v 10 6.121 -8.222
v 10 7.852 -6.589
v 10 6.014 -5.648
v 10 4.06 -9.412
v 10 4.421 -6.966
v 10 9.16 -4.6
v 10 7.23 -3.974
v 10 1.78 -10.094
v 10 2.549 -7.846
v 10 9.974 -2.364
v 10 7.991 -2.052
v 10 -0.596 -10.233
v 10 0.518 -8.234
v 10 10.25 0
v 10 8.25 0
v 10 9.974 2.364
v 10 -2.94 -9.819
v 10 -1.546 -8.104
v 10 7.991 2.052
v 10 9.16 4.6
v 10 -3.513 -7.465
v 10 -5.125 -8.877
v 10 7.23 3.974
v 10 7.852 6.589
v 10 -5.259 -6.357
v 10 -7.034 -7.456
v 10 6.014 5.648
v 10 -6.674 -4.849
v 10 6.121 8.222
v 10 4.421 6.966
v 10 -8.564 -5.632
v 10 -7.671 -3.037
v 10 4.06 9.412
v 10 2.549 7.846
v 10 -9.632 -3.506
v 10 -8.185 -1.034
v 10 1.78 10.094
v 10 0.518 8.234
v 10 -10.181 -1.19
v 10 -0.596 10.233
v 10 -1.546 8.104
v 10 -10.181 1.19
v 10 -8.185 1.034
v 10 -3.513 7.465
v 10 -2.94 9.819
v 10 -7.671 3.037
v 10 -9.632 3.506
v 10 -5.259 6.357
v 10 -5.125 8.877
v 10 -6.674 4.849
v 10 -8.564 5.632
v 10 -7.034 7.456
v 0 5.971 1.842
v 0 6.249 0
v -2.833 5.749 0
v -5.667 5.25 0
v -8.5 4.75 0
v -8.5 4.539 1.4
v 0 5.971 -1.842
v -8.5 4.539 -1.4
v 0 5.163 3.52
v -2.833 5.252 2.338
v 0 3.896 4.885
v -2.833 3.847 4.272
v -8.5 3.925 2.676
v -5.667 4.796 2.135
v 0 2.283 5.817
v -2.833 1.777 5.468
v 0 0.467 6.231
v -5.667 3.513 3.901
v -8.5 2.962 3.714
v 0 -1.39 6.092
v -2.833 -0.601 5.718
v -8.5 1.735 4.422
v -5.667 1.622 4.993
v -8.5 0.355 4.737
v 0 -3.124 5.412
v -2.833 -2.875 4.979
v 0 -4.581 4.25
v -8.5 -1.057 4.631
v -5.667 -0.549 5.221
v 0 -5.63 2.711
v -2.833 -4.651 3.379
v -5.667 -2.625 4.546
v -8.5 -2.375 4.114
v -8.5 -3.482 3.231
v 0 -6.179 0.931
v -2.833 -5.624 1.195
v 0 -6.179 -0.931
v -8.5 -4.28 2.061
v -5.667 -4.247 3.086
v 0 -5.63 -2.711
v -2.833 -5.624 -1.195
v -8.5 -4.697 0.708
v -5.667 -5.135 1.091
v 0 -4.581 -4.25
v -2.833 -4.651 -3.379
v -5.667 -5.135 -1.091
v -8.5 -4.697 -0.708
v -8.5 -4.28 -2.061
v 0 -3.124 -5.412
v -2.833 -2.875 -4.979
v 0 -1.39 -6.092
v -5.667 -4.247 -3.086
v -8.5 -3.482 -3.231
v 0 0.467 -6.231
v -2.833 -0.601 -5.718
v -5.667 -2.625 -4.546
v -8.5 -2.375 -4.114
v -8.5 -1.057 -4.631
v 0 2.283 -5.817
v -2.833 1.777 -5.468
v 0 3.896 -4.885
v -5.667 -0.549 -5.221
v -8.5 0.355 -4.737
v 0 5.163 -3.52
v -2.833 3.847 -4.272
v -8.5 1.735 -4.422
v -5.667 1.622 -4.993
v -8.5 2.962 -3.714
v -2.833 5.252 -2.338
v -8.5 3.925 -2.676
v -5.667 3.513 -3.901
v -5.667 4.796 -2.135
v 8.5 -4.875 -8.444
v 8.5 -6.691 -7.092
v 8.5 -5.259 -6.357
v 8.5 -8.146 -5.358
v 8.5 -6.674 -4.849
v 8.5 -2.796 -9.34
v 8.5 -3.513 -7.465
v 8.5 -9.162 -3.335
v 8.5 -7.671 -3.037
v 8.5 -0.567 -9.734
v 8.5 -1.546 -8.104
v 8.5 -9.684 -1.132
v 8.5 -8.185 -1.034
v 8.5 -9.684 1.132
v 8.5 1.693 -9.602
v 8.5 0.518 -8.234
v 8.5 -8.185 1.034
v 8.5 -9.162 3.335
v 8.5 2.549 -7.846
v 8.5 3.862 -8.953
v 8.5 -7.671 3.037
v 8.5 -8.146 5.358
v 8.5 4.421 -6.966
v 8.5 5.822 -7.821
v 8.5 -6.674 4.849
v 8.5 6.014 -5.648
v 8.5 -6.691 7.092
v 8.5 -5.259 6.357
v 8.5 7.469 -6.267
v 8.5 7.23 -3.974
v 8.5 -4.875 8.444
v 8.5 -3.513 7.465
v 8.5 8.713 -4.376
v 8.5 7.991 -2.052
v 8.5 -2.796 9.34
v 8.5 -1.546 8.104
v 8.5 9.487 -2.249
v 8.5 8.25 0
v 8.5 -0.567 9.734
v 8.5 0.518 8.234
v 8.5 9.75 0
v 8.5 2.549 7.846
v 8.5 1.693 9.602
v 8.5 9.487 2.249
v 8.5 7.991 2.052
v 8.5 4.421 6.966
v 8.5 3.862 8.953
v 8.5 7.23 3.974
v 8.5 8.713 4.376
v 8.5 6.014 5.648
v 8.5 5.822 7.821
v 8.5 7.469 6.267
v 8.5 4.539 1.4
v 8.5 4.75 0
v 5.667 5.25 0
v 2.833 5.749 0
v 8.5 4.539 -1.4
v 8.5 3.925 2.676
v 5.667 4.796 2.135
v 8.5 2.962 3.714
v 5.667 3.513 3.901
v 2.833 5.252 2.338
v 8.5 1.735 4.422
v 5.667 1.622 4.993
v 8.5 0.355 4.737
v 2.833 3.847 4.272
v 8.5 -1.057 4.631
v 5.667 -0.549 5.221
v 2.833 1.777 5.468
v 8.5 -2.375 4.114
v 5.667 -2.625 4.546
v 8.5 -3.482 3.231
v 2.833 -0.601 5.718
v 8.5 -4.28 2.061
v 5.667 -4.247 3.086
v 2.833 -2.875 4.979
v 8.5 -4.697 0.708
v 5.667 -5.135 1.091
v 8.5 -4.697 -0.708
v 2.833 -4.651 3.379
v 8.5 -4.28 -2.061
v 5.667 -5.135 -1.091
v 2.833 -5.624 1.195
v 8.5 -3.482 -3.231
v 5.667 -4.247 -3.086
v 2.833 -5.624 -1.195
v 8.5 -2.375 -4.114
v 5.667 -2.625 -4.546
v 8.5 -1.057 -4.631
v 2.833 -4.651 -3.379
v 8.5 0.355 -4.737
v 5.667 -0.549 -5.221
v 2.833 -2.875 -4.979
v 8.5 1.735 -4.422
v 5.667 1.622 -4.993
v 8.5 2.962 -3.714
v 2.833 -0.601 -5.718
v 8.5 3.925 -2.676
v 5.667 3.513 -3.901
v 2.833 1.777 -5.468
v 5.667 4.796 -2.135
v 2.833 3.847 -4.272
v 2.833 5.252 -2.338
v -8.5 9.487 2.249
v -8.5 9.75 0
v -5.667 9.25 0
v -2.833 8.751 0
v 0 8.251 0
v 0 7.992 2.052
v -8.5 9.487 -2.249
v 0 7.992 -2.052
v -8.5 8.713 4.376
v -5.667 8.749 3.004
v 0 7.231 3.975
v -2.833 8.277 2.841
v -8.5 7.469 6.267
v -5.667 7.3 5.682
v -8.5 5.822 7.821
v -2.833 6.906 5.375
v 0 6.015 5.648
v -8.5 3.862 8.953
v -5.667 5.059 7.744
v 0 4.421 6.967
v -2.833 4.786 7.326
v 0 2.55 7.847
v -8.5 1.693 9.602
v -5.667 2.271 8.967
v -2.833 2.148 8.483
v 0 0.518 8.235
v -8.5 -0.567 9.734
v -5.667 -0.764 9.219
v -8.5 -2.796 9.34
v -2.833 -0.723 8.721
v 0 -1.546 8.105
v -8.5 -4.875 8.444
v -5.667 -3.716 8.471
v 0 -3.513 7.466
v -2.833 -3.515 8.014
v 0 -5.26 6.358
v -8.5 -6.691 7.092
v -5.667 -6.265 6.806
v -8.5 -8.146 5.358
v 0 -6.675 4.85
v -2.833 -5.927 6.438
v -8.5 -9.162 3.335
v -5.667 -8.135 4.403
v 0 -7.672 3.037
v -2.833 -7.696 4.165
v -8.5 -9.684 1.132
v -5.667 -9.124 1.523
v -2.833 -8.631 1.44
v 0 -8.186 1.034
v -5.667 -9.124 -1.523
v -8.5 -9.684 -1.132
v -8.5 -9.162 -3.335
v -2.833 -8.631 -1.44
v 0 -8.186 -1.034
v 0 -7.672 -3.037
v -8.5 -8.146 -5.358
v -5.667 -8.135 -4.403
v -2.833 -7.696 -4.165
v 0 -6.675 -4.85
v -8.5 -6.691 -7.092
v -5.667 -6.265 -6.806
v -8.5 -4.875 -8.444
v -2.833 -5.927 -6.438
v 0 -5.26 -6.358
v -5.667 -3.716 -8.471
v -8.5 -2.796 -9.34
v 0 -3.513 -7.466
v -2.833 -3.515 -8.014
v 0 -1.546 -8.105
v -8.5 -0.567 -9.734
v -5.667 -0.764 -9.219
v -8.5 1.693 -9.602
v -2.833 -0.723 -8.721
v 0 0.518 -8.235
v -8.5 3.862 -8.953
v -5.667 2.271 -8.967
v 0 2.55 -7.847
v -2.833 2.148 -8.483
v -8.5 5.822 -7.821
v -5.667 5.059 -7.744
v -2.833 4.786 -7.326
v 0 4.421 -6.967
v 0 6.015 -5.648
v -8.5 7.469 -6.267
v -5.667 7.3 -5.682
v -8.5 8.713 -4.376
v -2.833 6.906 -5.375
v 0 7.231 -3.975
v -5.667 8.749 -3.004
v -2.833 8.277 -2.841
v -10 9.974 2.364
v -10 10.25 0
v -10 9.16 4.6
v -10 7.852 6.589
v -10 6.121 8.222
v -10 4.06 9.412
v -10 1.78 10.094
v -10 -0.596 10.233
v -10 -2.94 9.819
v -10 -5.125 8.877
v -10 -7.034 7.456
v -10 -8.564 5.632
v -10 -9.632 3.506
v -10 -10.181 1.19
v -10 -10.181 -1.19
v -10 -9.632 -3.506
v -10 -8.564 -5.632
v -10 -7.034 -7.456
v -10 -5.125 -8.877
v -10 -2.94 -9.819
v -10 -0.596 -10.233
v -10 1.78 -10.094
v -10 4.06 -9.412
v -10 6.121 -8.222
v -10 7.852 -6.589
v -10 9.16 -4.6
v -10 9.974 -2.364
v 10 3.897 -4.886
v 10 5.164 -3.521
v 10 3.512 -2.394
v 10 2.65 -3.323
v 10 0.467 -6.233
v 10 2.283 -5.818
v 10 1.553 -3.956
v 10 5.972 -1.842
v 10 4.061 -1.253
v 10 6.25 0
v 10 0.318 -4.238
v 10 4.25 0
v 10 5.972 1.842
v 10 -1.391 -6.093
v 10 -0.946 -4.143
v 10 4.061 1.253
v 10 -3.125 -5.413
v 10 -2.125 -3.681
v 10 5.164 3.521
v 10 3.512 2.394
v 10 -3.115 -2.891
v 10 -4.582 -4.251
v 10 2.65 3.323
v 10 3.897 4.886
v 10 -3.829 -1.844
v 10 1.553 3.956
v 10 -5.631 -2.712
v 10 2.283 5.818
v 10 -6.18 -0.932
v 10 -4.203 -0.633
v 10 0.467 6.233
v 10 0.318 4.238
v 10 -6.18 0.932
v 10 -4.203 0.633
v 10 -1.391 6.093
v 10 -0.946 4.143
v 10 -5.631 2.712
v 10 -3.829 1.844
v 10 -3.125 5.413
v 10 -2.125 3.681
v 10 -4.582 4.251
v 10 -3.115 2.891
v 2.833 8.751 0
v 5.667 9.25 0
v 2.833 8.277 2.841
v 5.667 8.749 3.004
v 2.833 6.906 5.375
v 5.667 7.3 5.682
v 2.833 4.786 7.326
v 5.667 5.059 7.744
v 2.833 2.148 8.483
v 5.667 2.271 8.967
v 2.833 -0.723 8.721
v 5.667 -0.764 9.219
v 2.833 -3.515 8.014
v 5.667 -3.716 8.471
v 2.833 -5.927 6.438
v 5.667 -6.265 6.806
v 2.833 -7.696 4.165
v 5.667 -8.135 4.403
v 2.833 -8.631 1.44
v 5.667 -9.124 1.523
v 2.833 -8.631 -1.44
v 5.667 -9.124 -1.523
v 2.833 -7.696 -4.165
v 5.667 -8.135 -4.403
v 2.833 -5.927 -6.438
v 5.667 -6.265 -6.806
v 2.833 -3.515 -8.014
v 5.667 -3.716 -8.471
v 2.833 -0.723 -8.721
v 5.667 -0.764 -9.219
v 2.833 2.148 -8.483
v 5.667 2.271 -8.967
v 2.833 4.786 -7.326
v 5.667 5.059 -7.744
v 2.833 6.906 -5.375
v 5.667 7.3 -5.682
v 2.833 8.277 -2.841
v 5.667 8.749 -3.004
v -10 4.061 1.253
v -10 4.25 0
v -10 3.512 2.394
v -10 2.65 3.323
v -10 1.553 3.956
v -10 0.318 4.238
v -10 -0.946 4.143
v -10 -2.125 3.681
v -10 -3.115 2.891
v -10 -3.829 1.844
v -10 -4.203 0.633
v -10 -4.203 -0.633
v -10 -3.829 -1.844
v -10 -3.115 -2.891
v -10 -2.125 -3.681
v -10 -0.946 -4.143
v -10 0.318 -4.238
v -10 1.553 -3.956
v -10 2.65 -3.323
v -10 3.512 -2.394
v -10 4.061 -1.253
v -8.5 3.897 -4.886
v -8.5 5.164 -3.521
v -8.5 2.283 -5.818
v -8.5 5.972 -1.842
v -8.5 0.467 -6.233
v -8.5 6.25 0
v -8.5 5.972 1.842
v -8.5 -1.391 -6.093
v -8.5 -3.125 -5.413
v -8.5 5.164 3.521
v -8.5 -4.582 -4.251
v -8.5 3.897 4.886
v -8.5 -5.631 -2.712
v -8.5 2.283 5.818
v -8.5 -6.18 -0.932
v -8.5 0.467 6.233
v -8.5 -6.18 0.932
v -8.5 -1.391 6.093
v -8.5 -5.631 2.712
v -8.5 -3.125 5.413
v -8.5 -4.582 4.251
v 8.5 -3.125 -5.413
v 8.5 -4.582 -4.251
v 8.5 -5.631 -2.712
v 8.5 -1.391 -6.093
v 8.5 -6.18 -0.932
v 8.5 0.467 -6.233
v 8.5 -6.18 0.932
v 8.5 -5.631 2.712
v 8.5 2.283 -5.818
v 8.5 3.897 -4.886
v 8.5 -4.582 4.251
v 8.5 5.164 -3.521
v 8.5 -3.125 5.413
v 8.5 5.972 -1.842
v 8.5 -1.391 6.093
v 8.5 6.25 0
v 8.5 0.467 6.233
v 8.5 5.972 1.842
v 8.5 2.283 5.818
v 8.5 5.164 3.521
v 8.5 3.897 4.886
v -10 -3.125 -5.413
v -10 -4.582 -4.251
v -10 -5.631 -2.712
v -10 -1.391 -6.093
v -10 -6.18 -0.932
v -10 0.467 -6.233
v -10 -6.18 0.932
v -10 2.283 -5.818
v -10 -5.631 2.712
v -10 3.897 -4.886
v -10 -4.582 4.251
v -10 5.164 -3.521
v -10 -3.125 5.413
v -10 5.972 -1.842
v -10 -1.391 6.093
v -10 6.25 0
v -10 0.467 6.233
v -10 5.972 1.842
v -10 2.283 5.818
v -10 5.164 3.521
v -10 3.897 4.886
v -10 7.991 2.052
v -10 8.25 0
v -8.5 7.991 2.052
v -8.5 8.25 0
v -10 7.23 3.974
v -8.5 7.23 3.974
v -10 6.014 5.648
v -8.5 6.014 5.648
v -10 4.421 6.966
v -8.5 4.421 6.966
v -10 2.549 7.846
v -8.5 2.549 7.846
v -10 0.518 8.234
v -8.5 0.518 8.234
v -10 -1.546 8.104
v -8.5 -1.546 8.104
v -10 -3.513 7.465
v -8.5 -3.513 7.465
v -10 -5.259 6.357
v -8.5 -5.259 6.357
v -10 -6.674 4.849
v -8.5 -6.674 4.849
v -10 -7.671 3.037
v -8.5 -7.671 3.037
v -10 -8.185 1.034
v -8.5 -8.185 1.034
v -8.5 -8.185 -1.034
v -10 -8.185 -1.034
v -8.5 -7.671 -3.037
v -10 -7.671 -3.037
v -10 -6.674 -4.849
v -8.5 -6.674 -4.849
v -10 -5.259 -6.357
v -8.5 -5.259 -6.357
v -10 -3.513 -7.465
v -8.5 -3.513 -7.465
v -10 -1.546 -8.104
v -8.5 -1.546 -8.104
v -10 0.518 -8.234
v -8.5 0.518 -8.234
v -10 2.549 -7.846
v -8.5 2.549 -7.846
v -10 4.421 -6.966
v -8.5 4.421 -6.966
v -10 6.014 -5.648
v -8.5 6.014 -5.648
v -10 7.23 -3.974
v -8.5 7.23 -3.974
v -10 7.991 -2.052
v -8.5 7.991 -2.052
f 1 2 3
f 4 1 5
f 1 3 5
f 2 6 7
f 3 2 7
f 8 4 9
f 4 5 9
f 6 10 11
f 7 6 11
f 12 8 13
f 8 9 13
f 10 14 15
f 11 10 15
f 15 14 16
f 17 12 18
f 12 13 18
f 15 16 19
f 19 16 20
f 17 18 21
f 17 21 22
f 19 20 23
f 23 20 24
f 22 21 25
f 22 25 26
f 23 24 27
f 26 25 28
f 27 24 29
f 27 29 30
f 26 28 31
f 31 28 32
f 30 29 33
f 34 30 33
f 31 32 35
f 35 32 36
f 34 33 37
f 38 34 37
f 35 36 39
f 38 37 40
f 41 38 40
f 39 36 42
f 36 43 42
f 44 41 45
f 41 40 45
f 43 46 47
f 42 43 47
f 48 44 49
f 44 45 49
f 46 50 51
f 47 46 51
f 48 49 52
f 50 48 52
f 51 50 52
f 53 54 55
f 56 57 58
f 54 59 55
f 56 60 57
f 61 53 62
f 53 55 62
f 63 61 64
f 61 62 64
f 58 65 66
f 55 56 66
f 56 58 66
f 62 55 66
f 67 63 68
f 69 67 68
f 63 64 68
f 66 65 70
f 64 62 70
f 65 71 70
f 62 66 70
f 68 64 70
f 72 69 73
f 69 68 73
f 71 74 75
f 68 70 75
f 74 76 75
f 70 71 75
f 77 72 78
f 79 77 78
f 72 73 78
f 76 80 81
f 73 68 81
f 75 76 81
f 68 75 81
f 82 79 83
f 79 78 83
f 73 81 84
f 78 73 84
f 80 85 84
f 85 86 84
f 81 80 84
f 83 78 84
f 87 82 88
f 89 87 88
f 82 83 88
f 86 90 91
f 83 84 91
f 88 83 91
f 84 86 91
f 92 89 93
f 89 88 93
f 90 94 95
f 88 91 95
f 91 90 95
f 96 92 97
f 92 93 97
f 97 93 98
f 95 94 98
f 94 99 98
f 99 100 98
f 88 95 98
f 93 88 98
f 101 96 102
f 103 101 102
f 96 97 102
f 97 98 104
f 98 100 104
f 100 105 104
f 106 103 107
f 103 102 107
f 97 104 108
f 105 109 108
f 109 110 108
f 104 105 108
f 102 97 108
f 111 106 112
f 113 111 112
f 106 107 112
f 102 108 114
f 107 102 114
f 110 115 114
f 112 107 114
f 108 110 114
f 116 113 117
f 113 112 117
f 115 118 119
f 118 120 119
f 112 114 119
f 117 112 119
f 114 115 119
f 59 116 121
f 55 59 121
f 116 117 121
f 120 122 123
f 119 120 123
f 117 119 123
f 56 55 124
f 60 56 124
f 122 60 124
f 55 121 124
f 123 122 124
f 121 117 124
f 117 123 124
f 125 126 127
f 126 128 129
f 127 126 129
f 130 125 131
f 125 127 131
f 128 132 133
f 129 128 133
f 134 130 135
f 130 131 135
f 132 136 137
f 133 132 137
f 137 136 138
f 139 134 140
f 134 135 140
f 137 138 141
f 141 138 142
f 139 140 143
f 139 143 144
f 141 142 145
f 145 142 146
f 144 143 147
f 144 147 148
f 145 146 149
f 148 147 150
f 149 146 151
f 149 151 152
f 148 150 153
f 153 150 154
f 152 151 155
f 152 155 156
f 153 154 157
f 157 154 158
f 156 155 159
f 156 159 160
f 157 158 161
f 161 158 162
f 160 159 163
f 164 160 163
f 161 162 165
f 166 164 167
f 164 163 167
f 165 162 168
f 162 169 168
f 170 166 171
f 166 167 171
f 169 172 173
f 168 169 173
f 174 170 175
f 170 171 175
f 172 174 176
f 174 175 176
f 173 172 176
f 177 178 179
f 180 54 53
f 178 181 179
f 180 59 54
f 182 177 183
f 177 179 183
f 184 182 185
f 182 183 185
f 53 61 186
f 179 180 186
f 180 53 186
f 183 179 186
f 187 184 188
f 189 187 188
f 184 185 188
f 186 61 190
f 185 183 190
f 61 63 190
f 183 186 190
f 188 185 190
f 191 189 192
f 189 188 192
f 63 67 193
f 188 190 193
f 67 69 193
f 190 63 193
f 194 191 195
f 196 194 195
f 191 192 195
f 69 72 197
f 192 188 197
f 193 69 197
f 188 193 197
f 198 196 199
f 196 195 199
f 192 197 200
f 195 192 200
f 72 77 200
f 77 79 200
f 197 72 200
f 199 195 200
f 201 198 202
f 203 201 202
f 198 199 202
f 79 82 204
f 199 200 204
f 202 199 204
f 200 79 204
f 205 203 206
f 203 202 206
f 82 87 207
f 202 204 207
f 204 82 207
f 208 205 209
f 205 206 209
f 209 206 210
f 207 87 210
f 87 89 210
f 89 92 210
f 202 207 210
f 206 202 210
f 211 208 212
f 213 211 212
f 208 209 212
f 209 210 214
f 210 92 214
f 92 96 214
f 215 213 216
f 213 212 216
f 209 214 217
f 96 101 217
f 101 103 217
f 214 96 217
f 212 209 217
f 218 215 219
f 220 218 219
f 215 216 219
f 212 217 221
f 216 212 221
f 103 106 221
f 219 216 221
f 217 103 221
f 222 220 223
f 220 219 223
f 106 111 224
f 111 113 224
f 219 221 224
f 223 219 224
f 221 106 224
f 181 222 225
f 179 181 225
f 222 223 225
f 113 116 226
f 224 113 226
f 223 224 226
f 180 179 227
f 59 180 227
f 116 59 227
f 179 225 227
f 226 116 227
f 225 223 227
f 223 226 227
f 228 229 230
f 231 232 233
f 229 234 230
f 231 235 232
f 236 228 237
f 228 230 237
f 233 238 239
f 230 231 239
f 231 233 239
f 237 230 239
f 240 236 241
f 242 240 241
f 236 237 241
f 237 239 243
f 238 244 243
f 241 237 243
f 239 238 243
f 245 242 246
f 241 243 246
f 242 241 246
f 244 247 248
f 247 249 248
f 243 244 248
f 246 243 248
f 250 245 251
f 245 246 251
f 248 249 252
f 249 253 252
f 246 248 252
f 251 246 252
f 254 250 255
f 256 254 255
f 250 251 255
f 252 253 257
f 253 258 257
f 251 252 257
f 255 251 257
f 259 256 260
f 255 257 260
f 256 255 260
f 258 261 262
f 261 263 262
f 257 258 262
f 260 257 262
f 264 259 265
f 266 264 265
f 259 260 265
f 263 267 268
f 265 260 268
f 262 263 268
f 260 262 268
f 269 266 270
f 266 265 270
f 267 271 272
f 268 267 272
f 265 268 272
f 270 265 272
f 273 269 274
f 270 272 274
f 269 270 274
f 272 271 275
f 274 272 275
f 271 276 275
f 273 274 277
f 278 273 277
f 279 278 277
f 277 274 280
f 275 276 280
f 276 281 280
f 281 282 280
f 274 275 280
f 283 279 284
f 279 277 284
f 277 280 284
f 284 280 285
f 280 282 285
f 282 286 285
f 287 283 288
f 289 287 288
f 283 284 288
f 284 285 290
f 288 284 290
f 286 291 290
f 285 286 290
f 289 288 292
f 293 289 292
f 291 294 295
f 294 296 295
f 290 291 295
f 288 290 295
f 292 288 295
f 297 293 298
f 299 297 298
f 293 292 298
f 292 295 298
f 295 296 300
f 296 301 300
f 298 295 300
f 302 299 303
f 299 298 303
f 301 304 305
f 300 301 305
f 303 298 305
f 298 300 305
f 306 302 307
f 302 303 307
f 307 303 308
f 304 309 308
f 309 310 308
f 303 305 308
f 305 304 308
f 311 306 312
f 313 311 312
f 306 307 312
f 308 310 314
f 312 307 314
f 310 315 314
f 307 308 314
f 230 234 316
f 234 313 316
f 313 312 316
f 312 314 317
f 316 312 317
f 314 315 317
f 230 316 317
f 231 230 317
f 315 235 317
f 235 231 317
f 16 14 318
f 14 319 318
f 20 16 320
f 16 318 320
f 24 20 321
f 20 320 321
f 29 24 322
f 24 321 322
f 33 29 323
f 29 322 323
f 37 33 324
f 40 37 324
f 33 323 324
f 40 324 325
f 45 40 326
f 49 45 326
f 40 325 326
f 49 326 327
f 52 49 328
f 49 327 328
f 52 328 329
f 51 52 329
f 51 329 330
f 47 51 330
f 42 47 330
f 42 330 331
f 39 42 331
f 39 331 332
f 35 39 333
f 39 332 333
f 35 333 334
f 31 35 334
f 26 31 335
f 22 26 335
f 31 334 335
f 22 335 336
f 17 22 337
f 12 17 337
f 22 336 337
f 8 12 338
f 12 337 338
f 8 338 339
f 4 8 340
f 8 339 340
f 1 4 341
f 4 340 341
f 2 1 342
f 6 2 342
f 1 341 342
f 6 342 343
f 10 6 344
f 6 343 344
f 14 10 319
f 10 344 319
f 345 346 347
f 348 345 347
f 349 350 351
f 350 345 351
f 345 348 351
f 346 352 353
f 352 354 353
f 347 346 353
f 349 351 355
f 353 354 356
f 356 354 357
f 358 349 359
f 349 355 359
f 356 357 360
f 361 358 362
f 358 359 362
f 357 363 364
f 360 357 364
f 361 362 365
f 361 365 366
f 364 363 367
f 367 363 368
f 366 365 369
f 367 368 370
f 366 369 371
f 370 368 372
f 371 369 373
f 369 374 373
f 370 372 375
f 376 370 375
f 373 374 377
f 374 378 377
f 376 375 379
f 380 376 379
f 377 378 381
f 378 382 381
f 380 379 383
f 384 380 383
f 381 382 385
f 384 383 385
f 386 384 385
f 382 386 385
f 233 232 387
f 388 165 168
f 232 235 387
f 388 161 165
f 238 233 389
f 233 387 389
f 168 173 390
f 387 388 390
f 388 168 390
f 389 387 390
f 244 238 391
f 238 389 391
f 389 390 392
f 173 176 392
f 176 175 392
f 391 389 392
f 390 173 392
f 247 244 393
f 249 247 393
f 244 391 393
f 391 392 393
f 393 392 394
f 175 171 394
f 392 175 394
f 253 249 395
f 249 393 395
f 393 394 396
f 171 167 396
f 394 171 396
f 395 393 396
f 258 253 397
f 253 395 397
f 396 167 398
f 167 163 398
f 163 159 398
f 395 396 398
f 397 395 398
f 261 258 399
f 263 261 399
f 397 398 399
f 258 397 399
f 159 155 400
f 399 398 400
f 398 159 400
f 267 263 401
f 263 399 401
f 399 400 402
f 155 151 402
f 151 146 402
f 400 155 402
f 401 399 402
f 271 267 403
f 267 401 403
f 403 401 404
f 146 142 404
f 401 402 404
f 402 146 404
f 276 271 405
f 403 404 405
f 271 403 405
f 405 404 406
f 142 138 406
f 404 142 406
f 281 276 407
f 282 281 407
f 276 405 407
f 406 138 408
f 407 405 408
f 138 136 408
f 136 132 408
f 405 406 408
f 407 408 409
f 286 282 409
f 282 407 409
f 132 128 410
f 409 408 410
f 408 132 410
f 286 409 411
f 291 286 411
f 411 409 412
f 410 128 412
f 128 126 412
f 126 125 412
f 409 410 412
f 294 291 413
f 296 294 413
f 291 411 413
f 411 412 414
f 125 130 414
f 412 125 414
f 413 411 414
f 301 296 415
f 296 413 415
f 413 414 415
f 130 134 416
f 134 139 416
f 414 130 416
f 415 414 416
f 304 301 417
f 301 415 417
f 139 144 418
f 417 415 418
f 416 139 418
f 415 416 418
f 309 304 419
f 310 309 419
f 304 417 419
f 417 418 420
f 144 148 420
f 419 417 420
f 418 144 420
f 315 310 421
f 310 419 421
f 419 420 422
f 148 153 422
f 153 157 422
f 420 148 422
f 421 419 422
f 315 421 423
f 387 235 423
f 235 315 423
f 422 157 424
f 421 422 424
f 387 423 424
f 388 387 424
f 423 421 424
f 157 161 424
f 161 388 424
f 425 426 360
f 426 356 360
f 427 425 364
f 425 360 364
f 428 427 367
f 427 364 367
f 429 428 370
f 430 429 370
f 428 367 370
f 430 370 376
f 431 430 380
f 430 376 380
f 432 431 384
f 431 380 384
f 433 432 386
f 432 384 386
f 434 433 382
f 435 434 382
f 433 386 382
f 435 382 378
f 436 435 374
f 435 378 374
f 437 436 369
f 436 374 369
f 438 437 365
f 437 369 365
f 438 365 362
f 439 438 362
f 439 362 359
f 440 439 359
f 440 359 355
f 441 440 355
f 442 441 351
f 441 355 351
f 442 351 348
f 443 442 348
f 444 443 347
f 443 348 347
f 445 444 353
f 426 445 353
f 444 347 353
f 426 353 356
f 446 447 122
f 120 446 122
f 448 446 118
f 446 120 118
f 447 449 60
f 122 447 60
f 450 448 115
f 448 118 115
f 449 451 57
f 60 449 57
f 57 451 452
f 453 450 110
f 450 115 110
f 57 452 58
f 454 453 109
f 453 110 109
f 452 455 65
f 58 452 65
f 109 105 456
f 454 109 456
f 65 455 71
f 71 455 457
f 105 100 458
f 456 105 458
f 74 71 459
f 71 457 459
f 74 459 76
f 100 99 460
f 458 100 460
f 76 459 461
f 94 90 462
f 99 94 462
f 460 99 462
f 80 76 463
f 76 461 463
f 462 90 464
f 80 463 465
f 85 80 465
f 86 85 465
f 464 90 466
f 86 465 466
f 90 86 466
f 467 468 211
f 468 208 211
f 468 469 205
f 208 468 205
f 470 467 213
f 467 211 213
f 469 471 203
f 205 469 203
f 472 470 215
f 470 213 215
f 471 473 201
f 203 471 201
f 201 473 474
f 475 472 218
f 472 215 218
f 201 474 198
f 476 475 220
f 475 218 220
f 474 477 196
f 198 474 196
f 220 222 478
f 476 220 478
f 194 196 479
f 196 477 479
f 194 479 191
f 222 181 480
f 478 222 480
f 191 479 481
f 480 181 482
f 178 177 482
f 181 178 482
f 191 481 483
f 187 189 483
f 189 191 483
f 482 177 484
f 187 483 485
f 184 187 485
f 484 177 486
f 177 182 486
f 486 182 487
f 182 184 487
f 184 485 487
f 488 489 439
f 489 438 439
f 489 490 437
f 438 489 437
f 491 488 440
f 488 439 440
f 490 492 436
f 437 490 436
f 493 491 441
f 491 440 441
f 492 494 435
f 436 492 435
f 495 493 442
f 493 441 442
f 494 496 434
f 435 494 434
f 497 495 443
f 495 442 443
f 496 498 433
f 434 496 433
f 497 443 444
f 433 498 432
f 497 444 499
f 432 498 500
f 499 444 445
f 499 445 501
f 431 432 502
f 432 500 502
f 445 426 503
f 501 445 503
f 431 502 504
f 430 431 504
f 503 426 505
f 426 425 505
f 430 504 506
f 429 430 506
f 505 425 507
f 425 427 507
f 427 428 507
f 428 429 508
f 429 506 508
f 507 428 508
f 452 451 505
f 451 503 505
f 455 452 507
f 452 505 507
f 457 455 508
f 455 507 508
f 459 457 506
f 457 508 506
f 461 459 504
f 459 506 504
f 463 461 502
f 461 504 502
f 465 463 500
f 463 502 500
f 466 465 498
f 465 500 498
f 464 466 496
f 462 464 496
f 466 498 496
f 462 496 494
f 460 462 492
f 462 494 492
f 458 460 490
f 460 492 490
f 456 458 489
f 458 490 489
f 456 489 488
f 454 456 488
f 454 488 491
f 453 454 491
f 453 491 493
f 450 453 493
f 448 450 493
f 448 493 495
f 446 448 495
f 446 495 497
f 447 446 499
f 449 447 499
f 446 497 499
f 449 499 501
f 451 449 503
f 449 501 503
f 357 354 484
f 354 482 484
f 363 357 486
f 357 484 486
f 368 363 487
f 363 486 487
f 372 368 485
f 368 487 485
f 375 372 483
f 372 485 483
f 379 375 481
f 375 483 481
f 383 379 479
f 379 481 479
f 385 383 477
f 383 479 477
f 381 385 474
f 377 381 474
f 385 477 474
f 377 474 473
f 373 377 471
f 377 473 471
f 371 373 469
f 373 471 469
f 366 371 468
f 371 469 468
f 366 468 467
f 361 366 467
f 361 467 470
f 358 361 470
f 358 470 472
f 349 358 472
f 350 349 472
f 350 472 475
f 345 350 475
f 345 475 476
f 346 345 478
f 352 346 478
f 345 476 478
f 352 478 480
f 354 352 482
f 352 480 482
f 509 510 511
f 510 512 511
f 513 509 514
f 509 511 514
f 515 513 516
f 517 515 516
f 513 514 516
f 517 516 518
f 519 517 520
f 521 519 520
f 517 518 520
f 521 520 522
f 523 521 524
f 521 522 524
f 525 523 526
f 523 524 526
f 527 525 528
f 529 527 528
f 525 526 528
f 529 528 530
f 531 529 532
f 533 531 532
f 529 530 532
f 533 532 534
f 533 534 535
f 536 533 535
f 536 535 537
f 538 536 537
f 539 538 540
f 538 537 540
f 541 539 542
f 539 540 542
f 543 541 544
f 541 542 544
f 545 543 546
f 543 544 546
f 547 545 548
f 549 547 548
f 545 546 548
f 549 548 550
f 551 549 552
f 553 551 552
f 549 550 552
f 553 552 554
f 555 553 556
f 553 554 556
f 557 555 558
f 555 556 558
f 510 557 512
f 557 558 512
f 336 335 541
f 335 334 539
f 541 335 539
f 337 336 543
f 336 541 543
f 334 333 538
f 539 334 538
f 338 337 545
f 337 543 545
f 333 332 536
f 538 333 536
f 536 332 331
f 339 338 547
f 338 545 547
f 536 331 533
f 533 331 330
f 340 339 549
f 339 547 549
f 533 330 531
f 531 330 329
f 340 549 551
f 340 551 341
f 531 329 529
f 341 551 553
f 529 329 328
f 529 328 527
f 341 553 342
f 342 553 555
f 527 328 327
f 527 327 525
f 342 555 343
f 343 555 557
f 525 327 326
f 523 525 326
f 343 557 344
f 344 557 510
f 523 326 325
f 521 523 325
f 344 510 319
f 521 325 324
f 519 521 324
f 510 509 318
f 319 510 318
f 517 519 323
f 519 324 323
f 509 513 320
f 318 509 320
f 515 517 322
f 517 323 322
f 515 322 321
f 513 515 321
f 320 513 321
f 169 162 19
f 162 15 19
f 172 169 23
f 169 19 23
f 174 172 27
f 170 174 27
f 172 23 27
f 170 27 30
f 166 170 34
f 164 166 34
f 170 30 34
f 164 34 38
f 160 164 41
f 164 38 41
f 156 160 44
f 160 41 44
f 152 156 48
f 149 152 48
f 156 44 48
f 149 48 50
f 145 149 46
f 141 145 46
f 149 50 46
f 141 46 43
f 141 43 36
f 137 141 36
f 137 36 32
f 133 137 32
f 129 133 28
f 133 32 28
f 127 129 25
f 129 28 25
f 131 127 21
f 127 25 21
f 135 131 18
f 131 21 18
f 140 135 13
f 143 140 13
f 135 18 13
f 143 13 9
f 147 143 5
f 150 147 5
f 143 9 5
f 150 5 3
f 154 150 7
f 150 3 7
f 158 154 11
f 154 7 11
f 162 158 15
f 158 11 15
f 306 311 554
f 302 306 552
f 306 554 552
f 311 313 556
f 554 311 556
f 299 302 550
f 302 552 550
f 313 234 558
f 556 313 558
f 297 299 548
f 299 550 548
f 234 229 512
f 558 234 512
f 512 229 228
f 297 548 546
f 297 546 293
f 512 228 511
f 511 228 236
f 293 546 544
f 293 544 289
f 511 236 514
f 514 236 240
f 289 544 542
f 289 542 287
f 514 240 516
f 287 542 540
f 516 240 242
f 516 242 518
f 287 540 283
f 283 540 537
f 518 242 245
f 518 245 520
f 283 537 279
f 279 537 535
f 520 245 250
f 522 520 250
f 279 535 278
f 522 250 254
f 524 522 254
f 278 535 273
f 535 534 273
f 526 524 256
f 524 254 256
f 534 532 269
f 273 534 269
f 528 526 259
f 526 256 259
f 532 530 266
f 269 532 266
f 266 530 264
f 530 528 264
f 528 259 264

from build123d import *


with BuildPart() as f1:
    # F0 (on Top) → F1 (revolve)
    with BuildSketch(Plane.XY):
        Polygon((-10, 6.25), (-10, 4.25), (10, 4.25), (10, 6.25), (8.5, 6.25), (8.5, 4.75), (0, 6.248779), (-8.5, 4.75), (-8.5, 6.25), align=None)
        Polygon((-10, 10.25), (-10, 8.25), (-8.5, 8.25), (-8.5, 9.75), (0, 8.251221), (8.5, 9.75), (8.5, 8.25), (10, 8.25), (10, 10.25), align=None)
    revolve(axis=Axis((6.478019, 0, 0), (1, 0, 0)))


solid = f1.part
